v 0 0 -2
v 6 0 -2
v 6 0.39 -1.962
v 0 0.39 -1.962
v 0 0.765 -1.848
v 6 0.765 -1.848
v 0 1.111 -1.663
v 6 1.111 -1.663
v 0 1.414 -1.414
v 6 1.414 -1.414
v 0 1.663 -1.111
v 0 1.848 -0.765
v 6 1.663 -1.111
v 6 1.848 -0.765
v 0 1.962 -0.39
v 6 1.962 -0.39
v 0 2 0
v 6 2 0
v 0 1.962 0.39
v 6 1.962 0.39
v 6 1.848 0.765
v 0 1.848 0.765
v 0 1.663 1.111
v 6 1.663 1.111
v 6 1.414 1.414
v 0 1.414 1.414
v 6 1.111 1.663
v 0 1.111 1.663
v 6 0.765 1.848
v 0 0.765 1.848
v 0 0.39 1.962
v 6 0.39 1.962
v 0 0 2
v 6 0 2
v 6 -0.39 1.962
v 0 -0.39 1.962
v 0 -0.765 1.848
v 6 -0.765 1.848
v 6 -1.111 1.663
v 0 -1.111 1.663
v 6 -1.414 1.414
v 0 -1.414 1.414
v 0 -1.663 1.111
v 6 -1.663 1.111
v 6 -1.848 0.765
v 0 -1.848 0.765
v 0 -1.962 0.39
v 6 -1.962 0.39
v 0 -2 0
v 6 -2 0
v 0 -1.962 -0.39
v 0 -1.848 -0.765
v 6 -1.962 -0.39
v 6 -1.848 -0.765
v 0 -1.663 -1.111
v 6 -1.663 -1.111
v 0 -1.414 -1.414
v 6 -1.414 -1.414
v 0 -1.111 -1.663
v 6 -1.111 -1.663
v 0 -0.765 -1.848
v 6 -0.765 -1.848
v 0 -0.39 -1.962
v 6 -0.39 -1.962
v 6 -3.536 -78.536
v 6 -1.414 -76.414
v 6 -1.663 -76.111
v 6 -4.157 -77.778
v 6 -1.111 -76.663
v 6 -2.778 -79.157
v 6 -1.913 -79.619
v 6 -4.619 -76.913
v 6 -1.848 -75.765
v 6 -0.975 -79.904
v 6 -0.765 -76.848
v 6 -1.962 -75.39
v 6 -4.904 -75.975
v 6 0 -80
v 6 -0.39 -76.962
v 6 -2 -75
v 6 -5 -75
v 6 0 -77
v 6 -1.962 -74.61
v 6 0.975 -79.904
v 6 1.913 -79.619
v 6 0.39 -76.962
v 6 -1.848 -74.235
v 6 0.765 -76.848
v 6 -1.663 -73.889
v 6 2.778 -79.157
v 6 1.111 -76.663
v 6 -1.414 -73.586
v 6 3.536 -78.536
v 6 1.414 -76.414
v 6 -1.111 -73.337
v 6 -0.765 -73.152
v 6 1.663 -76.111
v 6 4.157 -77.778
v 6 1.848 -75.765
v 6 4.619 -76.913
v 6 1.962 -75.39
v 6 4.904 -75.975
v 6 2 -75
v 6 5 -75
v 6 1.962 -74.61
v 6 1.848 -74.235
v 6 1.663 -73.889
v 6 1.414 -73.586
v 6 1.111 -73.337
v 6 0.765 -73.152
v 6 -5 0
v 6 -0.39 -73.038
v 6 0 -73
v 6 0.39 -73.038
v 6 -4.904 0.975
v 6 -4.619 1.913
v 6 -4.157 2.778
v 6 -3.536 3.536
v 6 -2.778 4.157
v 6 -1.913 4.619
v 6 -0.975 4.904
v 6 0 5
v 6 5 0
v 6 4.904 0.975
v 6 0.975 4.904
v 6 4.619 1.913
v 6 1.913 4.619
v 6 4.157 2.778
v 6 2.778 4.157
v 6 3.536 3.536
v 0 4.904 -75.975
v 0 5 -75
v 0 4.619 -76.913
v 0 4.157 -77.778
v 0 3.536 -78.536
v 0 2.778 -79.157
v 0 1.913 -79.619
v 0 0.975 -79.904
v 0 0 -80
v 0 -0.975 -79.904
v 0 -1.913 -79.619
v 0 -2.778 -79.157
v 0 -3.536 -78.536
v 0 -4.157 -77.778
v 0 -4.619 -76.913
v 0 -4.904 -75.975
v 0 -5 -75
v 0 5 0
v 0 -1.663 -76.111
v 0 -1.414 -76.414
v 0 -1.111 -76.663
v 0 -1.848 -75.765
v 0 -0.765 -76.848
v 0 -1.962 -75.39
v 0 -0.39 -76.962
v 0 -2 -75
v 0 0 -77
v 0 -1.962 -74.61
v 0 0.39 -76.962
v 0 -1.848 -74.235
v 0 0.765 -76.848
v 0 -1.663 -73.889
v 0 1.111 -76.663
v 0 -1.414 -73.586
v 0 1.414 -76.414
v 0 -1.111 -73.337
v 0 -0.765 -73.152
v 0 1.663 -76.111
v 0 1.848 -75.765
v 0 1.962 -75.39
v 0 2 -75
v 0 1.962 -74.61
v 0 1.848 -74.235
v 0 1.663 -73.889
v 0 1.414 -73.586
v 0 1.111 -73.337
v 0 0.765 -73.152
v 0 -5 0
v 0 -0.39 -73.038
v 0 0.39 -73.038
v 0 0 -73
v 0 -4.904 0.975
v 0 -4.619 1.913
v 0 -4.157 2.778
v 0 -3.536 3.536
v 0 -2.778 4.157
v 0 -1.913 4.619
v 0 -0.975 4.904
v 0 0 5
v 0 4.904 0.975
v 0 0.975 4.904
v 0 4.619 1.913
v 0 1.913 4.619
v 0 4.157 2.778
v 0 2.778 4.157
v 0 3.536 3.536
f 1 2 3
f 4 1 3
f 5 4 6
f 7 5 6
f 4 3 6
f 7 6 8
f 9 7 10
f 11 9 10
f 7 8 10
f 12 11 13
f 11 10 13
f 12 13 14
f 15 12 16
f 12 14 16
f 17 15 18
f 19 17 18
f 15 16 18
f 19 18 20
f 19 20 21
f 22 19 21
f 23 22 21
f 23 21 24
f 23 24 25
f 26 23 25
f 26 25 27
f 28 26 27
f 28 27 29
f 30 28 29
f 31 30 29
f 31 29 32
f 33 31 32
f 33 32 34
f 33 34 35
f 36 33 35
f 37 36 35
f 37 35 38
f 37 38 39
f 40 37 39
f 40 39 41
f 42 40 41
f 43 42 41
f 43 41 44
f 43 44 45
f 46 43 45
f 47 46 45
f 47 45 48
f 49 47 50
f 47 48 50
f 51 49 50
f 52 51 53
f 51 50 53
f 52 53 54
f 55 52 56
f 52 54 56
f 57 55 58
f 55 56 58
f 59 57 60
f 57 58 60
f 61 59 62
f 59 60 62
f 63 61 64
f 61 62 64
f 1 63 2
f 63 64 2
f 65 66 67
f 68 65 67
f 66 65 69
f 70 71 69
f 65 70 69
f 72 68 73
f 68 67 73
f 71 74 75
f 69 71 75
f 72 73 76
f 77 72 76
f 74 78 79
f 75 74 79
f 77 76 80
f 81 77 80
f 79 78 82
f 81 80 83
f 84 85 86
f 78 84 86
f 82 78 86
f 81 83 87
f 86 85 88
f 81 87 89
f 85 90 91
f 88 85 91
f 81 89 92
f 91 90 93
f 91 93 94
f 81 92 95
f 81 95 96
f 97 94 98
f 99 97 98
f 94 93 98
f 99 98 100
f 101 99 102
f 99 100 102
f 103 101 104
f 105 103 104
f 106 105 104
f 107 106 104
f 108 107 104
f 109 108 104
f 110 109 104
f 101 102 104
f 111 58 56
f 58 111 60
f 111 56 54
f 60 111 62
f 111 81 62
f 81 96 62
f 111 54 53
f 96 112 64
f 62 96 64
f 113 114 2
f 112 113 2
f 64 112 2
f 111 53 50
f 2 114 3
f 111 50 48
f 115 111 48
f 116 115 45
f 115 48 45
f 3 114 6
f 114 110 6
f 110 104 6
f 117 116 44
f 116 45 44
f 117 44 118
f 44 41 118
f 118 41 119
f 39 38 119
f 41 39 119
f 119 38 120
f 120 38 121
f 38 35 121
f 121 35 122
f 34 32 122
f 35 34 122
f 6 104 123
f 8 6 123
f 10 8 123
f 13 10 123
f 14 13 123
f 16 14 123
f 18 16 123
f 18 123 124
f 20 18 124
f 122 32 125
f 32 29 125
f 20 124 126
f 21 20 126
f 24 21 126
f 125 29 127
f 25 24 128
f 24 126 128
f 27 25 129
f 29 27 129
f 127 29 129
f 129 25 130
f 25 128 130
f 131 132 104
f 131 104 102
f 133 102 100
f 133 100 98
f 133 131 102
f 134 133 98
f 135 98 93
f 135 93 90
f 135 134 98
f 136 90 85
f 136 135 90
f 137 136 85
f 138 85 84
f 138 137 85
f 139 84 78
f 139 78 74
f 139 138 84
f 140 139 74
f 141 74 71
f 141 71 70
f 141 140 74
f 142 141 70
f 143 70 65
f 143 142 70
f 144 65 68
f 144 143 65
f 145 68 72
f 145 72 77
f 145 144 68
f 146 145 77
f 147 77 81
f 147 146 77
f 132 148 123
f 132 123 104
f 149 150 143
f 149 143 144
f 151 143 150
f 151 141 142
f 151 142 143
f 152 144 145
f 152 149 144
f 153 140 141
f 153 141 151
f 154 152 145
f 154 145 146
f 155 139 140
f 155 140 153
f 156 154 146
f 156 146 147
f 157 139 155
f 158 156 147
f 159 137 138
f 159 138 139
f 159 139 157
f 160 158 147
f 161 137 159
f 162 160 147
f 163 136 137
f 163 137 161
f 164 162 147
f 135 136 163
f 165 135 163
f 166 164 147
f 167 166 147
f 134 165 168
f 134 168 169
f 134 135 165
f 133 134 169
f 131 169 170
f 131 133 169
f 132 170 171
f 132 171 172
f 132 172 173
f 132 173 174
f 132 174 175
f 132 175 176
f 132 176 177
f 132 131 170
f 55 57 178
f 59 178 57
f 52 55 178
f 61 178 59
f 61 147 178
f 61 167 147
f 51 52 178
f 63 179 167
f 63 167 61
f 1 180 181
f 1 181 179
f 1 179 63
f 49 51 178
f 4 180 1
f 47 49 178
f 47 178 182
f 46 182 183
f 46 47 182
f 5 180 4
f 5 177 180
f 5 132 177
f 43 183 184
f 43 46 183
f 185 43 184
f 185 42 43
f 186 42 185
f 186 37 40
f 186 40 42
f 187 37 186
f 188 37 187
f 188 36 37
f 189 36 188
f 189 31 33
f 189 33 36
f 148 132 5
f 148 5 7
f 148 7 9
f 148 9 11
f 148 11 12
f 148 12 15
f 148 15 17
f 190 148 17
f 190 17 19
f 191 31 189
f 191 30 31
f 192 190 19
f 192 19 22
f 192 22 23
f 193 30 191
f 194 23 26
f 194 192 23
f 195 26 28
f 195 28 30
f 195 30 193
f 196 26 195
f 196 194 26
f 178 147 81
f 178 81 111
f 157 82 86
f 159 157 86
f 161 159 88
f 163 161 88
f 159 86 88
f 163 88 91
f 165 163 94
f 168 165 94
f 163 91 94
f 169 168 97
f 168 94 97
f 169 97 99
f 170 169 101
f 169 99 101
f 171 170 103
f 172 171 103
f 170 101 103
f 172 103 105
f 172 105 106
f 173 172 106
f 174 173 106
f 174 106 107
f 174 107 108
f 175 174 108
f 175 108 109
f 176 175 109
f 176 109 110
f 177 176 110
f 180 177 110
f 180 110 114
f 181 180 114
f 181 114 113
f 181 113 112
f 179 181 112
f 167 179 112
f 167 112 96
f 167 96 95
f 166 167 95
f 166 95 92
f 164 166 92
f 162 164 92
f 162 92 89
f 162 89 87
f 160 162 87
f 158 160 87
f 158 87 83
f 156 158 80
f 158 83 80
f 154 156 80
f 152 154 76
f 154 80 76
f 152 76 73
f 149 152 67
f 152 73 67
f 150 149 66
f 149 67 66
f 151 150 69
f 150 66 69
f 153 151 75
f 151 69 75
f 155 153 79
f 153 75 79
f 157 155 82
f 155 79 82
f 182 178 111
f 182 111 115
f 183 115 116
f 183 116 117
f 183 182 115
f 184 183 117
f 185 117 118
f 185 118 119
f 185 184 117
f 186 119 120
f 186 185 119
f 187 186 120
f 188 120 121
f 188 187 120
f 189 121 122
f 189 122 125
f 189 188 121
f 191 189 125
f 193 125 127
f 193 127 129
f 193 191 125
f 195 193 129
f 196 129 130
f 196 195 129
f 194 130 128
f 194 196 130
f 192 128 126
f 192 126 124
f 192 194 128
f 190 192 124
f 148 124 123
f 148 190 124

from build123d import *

# Parameters (mm, degrees)
EXTRUDE_1_DEPTH     = 6
SKETCH_2_R          = 2
CUT_EXTRUDE_1_DEPTH = 81.380345856


with BuildPart() as part:
    # 草图1 → 凸台-拉伸1 (new body)
    with BuildSketch(Plane(origin=(0, 0, 0), x_dir=(0, 0, -1), z_dir=(1, 0, 0))):
        with BuildLine():
            Line((0, 5), (75, 5))
            ThreePointArc((75, 5), (80, 0), (75, -5))
            Line((75, -5), (0, -5))
            ThreePointArc((0, -5), (-5, 0), (0, 5))
        make_face()
    extrude(amount=EXTRUDE_1_DEPTH)

    # 草图2 → 切除-拉伸1 (cut, through all)
    with BuildSketch(Plane(origin=(6, 0, 0), x_dir=(0, 0, -1), z_dir=(1, 0, 0))):
        with Locations((75, 0)):
            Circle(SKETCH_2_R)
        Circle(SKETCH_2_R)
    extrude(amount=-CUT_EXTRUDE_1_DEPTH, mode=Mode.SUBTRACT)


solid = part.part
